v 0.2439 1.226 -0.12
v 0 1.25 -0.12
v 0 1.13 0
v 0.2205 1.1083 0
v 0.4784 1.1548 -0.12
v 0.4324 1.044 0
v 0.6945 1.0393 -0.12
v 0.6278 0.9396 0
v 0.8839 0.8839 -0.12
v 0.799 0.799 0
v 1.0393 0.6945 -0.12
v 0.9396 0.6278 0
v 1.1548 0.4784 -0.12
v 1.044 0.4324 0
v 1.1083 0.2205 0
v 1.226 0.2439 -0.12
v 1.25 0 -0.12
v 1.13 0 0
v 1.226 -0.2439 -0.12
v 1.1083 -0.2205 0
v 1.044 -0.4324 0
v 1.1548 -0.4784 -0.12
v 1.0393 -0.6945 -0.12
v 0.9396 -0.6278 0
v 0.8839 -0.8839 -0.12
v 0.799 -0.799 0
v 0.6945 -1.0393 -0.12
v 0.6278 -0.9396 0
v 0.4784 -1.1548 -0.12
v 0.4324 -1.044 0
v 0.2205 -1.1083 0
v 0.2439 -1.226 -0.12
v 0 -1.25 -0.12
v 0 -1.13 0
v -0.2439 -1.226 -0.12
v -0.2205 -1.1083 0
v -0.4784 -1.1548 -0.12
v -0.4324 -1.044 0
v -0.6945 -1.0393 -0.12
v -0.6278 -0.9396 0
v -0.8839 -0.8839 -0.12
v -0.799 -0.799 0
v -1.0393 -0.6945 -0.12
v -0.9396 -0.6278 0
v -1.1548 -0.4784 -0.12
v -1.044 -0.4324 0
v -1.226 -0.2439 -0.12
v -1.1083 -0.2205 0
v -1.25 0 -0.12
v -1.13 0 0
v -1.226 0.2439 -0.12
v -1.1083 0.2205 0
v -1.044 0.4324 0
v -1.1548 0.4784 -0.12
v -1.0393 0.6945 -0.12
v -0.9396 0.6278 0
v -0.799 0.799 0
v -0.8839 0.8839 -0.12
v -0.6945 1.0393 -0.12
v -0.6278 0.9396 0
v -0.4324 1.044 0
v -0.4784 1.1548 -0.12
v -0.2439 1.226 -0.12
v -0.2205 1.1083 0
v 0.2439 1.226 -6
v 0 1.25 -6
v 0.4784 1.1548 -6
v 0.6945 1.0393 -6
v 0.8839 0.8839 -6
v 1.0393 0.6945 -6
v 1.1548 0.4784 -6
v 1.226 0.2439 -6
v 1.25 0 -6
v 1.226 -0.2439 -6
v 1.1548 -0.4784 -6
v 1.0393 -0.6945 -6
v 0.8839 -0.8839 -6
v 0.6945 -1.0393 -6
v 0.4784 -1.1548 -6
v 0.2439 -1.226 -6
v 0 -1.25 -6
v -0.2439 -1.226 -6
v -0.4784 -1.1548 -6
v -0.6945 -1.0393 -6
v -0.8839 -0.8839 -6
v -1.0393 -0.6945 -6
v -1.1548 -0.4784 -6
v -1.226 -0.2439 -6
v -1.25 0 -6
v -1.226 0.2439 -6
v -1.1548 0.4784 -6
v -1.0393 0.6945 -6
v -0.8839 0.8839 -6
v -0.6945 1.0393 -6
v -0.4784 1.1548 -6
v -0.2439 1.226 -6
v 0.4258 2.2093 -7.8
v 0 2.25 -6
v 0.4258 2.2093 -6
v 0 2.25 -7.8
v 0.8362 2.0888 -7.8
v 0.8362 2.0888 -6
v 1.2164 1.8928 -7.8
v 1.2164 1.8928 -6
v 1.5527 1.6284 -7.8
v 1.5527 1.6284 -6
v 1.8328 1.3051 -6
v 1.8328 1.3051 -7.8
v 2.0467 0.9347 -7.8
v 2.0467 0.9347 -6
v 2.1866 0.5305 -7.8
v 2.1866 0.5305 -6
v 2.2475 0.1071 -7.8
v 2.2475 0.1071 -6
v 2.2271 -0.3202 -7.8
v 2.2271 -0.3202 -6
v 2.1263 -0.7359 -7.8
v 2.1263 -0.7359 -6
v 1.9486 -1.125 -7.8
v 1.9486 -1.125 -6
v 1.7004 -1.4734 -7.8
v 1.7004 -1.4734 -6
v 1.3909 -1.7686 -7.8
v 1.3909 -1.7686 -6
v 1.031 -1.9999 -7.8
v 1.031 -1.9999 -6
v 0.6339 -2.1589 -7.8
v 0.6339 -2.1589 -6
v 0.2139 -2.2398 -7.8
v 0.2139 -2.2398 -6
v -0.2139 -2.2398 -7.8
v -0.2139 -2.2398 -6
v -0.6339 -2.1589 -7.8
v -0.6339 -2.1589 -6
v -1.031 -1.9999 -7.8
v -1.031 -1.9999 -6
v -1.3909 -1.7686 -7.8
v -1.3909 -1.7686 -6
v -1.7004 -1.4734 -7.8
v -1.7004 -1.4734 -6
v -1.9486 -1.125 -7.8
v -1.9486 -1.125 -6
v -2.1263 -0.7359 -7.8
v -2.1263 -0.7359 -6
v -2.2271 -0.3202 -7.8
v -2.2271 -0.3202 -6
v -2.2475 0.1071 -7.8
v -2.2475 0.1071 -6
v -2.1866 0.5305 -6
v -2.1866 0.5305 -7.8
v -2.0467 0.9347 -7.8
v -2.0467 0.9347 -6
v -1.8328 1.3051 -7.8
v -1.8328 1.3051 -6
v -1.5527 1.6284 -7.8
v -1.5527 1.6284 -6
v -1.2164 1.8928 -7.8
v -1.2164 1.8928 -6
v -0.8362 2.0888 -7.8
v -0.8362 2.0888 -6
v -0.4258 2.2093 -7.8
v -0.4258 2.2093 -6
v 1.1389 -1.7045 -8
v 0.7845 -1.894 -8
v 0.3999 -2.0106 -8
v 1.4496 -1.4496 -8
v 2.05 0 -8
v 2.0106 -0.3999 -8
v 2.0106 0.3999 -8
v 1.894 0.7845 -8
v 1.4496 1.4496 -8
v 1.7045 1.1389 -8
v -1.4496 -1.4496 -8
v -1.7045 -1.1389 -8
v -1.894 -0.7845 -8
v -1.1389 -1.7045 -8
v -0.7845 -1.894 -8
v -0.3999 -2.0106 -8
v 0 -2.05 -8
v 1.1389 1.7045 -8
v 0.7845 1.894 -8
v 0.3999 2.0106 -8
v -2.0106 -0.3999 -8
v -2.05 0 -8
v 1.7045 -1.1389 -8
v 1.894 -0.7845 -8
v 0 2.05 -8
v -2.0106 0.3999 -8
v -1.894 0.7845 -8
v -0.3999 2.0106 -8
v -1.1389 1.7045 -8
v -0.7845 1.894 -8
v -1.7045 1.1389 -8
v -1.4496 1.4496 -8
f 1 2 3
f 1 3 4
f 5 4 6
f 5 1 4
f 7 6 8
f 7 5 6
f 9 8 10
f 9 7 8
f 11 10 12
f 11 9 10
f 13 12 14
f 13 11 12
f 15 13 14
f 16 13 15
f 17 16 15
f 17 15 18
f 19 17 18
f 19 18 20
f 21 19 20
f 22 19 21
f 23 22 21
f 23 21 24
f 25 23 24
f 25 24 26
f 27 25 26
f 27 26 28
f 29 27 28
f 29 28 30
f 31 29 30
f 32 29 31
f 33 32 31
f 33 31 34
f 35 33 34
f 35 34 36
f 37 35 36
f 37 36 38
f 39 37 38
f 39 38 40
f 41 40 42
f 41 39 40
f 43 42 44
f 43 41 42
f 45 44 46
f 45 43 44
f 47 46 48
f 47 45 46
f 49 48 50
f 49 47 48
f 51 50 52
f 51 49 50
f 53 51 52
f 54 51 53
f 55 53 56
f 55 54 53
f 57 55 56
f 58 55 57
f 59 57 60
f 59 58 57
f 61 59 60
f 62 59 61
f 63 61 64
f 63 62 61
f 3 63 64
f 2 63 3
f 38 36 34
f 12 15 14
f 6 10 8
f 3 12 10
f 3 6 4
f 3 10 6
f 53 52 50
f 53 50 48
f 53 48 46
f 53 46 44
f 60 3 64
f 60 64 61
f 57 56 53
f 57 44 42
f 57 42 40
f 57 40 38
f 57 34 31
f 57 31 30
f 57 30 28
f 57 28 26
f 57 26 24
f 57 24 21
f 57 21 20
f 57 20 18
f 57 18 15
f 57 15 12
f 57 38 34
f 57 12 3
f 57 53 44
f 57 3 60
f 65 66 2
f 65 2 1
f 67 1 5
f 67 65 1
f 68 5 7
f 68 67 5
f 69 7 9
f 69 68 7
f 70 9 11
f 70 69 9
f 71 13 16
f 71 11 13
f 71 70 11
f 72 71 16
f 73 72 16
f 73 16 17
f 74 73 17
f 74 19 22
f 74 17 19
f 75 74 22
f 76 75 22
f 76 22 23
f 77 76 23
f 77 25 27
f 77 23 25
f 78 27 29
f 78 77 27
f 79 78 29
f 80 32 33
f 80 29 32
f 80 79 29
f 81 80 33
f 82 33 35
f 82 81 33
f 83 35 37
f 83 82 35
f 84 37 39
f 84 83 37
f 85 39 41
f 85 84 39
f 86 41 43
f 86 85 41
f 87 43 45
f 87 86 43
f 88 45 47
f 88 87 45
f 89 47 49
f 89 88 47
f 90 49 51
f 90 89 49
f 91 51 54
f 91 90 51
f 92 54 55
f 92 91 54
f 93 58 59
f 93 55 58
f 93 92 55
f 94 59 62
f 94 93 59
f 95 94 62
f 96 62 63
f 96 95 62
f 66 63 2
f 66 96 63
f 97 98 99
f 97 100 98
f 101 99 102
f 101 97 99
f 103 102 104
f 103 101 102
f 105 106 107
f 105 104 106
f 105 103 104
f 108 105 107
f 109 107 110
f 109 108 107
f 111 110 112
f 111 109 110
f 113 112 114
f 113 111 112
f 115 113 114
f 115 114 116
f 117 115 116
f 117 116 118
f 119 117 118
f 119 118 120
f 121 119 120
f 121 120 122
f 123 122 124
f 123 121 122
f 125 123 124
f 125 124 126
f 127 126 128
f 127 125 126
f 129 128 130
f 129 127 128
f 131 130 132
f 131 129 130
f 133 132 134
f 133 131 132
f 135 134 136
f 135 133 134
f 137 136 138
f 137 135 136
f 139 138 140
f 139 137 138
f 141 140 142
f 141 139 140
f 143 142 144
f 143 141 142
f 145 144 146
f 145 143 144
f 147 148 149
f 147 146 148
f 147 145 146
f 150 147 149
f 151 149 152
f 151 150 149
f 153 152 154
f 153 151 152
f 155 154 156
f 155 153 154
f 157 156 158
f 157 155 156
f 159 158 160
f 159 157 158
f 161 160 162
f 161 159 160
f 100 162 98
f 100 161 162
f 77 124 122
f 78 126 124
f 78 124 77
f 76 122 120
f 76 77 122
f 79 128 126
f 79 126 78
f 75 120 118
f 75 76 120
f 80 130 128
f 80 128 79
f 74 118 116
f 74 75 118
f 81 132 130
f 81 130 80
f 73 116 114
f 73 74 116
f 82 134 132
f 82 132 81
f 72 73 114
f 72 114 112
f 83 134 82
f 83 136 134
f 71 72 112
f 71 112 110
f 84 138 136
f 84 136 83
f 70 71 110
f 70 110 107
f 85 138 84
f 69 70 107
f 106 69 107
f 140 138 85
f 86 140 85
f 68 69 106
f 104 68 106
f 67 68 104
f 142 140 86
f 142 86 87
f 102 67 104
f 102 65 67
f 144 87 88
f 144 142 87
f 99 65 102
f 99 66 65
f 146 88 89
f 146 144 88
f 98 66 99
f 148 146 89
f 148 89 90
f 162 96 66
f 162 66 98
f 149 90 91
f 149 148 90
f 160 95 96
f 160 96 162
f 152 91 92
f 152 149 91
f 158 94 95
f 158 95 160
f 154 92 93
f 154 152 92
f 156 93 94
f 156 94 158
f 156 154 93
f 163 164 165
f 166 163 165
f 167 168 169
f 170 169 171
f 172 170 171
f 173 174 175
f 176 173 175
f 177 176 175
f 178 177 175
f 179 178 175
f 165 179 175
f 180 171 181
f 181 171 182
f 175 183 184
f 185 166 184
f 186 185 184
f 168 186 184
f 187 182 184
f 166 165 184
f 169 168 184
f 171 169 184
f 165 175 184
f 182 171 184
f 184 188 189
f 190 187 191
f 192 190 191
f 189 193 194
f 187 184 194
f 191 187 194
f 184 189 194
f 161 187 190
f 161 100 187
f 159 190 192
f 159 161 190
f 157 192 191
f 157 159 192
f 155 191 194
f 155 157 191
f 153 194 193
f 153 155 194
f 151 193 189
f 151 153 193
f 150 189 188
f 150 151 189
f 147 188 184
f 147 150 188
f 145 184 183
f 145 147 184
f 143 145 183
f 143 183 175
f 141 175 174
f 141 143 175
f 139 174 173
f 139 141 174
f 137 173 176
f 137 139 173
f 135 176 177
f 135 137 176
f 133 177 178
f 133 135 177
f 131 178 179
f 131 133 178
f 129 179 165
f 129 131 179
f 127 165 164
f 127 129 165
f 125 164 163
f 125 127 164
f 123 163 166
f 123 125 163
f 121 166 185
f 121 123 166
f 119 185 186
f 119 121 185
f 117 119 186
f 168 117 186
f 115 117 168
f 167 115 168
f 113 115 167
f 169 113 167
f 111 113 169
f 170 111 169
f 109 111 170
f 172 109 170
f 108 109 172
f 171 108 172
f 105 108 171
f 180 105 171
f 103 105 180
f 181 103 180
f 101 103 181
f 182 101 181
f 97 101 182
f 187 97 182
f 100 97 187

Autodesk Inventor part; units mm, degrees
ref_plane "YZ Plane" through (0, 0, 0) normal (1, 0, 0) x (0, 1, 0)
ref_plane "XZ Plane" through (0, 0, 0) normal (0, 1, 0) x (-1, 0, 0)
ref_plane "XY Plane" through (0, 0, 0) normal (0, 0, 1) x (1, 0, 0)
sketch "スケッチ1" plane through (0, 0, 0) normal (1, 0, 0) x (0, 1, 0)
  line L0 (0, 0) -> (1.25, 0)
  line L1 (1.25, 0) -> (1.25, -6)
  line L2 (1.25, -6) -> (0, -6)
  line L3 (0, -6) -> (0, 0)
  line L4 (0, -6) -> (2.25, -6)
  line L5 (2.25, -6) -> (2.25, -8)
  line L6 (2.25, -8) -> (0, -8)
  line L7 (0, -8) -> (0, -6)
  line L8 (2.25, -7.8) -> (2.05, -8)
  line L9 (1.25, -0.12) -> (1.13, 0)
  point P0 (2.25, -7)
  dimension "d0" = 45
  dimension "d1" = 2.25
  dimension "d2" = 2
  dimension "d3" = 6
  dimension "d7" = 1.25
  dimension "d10" = 45
  dimension "d11" = 0.2
  dimension "d12" = 0.12
revolve "回転1" add sketch "スケッチ1" angle 360 about axis through (0, 0, -6) along (0, 0, 1) contours L0 L9 L1 L2 L3 | L2 L4 L5 L8 L6 L7
thread "ねじ2" size "M2.5x0.45" class "6g" standard "ANSI Metric M Profile" length 30
properties part number "CSH-316L-M2-5" material "ステンレス鋼"
